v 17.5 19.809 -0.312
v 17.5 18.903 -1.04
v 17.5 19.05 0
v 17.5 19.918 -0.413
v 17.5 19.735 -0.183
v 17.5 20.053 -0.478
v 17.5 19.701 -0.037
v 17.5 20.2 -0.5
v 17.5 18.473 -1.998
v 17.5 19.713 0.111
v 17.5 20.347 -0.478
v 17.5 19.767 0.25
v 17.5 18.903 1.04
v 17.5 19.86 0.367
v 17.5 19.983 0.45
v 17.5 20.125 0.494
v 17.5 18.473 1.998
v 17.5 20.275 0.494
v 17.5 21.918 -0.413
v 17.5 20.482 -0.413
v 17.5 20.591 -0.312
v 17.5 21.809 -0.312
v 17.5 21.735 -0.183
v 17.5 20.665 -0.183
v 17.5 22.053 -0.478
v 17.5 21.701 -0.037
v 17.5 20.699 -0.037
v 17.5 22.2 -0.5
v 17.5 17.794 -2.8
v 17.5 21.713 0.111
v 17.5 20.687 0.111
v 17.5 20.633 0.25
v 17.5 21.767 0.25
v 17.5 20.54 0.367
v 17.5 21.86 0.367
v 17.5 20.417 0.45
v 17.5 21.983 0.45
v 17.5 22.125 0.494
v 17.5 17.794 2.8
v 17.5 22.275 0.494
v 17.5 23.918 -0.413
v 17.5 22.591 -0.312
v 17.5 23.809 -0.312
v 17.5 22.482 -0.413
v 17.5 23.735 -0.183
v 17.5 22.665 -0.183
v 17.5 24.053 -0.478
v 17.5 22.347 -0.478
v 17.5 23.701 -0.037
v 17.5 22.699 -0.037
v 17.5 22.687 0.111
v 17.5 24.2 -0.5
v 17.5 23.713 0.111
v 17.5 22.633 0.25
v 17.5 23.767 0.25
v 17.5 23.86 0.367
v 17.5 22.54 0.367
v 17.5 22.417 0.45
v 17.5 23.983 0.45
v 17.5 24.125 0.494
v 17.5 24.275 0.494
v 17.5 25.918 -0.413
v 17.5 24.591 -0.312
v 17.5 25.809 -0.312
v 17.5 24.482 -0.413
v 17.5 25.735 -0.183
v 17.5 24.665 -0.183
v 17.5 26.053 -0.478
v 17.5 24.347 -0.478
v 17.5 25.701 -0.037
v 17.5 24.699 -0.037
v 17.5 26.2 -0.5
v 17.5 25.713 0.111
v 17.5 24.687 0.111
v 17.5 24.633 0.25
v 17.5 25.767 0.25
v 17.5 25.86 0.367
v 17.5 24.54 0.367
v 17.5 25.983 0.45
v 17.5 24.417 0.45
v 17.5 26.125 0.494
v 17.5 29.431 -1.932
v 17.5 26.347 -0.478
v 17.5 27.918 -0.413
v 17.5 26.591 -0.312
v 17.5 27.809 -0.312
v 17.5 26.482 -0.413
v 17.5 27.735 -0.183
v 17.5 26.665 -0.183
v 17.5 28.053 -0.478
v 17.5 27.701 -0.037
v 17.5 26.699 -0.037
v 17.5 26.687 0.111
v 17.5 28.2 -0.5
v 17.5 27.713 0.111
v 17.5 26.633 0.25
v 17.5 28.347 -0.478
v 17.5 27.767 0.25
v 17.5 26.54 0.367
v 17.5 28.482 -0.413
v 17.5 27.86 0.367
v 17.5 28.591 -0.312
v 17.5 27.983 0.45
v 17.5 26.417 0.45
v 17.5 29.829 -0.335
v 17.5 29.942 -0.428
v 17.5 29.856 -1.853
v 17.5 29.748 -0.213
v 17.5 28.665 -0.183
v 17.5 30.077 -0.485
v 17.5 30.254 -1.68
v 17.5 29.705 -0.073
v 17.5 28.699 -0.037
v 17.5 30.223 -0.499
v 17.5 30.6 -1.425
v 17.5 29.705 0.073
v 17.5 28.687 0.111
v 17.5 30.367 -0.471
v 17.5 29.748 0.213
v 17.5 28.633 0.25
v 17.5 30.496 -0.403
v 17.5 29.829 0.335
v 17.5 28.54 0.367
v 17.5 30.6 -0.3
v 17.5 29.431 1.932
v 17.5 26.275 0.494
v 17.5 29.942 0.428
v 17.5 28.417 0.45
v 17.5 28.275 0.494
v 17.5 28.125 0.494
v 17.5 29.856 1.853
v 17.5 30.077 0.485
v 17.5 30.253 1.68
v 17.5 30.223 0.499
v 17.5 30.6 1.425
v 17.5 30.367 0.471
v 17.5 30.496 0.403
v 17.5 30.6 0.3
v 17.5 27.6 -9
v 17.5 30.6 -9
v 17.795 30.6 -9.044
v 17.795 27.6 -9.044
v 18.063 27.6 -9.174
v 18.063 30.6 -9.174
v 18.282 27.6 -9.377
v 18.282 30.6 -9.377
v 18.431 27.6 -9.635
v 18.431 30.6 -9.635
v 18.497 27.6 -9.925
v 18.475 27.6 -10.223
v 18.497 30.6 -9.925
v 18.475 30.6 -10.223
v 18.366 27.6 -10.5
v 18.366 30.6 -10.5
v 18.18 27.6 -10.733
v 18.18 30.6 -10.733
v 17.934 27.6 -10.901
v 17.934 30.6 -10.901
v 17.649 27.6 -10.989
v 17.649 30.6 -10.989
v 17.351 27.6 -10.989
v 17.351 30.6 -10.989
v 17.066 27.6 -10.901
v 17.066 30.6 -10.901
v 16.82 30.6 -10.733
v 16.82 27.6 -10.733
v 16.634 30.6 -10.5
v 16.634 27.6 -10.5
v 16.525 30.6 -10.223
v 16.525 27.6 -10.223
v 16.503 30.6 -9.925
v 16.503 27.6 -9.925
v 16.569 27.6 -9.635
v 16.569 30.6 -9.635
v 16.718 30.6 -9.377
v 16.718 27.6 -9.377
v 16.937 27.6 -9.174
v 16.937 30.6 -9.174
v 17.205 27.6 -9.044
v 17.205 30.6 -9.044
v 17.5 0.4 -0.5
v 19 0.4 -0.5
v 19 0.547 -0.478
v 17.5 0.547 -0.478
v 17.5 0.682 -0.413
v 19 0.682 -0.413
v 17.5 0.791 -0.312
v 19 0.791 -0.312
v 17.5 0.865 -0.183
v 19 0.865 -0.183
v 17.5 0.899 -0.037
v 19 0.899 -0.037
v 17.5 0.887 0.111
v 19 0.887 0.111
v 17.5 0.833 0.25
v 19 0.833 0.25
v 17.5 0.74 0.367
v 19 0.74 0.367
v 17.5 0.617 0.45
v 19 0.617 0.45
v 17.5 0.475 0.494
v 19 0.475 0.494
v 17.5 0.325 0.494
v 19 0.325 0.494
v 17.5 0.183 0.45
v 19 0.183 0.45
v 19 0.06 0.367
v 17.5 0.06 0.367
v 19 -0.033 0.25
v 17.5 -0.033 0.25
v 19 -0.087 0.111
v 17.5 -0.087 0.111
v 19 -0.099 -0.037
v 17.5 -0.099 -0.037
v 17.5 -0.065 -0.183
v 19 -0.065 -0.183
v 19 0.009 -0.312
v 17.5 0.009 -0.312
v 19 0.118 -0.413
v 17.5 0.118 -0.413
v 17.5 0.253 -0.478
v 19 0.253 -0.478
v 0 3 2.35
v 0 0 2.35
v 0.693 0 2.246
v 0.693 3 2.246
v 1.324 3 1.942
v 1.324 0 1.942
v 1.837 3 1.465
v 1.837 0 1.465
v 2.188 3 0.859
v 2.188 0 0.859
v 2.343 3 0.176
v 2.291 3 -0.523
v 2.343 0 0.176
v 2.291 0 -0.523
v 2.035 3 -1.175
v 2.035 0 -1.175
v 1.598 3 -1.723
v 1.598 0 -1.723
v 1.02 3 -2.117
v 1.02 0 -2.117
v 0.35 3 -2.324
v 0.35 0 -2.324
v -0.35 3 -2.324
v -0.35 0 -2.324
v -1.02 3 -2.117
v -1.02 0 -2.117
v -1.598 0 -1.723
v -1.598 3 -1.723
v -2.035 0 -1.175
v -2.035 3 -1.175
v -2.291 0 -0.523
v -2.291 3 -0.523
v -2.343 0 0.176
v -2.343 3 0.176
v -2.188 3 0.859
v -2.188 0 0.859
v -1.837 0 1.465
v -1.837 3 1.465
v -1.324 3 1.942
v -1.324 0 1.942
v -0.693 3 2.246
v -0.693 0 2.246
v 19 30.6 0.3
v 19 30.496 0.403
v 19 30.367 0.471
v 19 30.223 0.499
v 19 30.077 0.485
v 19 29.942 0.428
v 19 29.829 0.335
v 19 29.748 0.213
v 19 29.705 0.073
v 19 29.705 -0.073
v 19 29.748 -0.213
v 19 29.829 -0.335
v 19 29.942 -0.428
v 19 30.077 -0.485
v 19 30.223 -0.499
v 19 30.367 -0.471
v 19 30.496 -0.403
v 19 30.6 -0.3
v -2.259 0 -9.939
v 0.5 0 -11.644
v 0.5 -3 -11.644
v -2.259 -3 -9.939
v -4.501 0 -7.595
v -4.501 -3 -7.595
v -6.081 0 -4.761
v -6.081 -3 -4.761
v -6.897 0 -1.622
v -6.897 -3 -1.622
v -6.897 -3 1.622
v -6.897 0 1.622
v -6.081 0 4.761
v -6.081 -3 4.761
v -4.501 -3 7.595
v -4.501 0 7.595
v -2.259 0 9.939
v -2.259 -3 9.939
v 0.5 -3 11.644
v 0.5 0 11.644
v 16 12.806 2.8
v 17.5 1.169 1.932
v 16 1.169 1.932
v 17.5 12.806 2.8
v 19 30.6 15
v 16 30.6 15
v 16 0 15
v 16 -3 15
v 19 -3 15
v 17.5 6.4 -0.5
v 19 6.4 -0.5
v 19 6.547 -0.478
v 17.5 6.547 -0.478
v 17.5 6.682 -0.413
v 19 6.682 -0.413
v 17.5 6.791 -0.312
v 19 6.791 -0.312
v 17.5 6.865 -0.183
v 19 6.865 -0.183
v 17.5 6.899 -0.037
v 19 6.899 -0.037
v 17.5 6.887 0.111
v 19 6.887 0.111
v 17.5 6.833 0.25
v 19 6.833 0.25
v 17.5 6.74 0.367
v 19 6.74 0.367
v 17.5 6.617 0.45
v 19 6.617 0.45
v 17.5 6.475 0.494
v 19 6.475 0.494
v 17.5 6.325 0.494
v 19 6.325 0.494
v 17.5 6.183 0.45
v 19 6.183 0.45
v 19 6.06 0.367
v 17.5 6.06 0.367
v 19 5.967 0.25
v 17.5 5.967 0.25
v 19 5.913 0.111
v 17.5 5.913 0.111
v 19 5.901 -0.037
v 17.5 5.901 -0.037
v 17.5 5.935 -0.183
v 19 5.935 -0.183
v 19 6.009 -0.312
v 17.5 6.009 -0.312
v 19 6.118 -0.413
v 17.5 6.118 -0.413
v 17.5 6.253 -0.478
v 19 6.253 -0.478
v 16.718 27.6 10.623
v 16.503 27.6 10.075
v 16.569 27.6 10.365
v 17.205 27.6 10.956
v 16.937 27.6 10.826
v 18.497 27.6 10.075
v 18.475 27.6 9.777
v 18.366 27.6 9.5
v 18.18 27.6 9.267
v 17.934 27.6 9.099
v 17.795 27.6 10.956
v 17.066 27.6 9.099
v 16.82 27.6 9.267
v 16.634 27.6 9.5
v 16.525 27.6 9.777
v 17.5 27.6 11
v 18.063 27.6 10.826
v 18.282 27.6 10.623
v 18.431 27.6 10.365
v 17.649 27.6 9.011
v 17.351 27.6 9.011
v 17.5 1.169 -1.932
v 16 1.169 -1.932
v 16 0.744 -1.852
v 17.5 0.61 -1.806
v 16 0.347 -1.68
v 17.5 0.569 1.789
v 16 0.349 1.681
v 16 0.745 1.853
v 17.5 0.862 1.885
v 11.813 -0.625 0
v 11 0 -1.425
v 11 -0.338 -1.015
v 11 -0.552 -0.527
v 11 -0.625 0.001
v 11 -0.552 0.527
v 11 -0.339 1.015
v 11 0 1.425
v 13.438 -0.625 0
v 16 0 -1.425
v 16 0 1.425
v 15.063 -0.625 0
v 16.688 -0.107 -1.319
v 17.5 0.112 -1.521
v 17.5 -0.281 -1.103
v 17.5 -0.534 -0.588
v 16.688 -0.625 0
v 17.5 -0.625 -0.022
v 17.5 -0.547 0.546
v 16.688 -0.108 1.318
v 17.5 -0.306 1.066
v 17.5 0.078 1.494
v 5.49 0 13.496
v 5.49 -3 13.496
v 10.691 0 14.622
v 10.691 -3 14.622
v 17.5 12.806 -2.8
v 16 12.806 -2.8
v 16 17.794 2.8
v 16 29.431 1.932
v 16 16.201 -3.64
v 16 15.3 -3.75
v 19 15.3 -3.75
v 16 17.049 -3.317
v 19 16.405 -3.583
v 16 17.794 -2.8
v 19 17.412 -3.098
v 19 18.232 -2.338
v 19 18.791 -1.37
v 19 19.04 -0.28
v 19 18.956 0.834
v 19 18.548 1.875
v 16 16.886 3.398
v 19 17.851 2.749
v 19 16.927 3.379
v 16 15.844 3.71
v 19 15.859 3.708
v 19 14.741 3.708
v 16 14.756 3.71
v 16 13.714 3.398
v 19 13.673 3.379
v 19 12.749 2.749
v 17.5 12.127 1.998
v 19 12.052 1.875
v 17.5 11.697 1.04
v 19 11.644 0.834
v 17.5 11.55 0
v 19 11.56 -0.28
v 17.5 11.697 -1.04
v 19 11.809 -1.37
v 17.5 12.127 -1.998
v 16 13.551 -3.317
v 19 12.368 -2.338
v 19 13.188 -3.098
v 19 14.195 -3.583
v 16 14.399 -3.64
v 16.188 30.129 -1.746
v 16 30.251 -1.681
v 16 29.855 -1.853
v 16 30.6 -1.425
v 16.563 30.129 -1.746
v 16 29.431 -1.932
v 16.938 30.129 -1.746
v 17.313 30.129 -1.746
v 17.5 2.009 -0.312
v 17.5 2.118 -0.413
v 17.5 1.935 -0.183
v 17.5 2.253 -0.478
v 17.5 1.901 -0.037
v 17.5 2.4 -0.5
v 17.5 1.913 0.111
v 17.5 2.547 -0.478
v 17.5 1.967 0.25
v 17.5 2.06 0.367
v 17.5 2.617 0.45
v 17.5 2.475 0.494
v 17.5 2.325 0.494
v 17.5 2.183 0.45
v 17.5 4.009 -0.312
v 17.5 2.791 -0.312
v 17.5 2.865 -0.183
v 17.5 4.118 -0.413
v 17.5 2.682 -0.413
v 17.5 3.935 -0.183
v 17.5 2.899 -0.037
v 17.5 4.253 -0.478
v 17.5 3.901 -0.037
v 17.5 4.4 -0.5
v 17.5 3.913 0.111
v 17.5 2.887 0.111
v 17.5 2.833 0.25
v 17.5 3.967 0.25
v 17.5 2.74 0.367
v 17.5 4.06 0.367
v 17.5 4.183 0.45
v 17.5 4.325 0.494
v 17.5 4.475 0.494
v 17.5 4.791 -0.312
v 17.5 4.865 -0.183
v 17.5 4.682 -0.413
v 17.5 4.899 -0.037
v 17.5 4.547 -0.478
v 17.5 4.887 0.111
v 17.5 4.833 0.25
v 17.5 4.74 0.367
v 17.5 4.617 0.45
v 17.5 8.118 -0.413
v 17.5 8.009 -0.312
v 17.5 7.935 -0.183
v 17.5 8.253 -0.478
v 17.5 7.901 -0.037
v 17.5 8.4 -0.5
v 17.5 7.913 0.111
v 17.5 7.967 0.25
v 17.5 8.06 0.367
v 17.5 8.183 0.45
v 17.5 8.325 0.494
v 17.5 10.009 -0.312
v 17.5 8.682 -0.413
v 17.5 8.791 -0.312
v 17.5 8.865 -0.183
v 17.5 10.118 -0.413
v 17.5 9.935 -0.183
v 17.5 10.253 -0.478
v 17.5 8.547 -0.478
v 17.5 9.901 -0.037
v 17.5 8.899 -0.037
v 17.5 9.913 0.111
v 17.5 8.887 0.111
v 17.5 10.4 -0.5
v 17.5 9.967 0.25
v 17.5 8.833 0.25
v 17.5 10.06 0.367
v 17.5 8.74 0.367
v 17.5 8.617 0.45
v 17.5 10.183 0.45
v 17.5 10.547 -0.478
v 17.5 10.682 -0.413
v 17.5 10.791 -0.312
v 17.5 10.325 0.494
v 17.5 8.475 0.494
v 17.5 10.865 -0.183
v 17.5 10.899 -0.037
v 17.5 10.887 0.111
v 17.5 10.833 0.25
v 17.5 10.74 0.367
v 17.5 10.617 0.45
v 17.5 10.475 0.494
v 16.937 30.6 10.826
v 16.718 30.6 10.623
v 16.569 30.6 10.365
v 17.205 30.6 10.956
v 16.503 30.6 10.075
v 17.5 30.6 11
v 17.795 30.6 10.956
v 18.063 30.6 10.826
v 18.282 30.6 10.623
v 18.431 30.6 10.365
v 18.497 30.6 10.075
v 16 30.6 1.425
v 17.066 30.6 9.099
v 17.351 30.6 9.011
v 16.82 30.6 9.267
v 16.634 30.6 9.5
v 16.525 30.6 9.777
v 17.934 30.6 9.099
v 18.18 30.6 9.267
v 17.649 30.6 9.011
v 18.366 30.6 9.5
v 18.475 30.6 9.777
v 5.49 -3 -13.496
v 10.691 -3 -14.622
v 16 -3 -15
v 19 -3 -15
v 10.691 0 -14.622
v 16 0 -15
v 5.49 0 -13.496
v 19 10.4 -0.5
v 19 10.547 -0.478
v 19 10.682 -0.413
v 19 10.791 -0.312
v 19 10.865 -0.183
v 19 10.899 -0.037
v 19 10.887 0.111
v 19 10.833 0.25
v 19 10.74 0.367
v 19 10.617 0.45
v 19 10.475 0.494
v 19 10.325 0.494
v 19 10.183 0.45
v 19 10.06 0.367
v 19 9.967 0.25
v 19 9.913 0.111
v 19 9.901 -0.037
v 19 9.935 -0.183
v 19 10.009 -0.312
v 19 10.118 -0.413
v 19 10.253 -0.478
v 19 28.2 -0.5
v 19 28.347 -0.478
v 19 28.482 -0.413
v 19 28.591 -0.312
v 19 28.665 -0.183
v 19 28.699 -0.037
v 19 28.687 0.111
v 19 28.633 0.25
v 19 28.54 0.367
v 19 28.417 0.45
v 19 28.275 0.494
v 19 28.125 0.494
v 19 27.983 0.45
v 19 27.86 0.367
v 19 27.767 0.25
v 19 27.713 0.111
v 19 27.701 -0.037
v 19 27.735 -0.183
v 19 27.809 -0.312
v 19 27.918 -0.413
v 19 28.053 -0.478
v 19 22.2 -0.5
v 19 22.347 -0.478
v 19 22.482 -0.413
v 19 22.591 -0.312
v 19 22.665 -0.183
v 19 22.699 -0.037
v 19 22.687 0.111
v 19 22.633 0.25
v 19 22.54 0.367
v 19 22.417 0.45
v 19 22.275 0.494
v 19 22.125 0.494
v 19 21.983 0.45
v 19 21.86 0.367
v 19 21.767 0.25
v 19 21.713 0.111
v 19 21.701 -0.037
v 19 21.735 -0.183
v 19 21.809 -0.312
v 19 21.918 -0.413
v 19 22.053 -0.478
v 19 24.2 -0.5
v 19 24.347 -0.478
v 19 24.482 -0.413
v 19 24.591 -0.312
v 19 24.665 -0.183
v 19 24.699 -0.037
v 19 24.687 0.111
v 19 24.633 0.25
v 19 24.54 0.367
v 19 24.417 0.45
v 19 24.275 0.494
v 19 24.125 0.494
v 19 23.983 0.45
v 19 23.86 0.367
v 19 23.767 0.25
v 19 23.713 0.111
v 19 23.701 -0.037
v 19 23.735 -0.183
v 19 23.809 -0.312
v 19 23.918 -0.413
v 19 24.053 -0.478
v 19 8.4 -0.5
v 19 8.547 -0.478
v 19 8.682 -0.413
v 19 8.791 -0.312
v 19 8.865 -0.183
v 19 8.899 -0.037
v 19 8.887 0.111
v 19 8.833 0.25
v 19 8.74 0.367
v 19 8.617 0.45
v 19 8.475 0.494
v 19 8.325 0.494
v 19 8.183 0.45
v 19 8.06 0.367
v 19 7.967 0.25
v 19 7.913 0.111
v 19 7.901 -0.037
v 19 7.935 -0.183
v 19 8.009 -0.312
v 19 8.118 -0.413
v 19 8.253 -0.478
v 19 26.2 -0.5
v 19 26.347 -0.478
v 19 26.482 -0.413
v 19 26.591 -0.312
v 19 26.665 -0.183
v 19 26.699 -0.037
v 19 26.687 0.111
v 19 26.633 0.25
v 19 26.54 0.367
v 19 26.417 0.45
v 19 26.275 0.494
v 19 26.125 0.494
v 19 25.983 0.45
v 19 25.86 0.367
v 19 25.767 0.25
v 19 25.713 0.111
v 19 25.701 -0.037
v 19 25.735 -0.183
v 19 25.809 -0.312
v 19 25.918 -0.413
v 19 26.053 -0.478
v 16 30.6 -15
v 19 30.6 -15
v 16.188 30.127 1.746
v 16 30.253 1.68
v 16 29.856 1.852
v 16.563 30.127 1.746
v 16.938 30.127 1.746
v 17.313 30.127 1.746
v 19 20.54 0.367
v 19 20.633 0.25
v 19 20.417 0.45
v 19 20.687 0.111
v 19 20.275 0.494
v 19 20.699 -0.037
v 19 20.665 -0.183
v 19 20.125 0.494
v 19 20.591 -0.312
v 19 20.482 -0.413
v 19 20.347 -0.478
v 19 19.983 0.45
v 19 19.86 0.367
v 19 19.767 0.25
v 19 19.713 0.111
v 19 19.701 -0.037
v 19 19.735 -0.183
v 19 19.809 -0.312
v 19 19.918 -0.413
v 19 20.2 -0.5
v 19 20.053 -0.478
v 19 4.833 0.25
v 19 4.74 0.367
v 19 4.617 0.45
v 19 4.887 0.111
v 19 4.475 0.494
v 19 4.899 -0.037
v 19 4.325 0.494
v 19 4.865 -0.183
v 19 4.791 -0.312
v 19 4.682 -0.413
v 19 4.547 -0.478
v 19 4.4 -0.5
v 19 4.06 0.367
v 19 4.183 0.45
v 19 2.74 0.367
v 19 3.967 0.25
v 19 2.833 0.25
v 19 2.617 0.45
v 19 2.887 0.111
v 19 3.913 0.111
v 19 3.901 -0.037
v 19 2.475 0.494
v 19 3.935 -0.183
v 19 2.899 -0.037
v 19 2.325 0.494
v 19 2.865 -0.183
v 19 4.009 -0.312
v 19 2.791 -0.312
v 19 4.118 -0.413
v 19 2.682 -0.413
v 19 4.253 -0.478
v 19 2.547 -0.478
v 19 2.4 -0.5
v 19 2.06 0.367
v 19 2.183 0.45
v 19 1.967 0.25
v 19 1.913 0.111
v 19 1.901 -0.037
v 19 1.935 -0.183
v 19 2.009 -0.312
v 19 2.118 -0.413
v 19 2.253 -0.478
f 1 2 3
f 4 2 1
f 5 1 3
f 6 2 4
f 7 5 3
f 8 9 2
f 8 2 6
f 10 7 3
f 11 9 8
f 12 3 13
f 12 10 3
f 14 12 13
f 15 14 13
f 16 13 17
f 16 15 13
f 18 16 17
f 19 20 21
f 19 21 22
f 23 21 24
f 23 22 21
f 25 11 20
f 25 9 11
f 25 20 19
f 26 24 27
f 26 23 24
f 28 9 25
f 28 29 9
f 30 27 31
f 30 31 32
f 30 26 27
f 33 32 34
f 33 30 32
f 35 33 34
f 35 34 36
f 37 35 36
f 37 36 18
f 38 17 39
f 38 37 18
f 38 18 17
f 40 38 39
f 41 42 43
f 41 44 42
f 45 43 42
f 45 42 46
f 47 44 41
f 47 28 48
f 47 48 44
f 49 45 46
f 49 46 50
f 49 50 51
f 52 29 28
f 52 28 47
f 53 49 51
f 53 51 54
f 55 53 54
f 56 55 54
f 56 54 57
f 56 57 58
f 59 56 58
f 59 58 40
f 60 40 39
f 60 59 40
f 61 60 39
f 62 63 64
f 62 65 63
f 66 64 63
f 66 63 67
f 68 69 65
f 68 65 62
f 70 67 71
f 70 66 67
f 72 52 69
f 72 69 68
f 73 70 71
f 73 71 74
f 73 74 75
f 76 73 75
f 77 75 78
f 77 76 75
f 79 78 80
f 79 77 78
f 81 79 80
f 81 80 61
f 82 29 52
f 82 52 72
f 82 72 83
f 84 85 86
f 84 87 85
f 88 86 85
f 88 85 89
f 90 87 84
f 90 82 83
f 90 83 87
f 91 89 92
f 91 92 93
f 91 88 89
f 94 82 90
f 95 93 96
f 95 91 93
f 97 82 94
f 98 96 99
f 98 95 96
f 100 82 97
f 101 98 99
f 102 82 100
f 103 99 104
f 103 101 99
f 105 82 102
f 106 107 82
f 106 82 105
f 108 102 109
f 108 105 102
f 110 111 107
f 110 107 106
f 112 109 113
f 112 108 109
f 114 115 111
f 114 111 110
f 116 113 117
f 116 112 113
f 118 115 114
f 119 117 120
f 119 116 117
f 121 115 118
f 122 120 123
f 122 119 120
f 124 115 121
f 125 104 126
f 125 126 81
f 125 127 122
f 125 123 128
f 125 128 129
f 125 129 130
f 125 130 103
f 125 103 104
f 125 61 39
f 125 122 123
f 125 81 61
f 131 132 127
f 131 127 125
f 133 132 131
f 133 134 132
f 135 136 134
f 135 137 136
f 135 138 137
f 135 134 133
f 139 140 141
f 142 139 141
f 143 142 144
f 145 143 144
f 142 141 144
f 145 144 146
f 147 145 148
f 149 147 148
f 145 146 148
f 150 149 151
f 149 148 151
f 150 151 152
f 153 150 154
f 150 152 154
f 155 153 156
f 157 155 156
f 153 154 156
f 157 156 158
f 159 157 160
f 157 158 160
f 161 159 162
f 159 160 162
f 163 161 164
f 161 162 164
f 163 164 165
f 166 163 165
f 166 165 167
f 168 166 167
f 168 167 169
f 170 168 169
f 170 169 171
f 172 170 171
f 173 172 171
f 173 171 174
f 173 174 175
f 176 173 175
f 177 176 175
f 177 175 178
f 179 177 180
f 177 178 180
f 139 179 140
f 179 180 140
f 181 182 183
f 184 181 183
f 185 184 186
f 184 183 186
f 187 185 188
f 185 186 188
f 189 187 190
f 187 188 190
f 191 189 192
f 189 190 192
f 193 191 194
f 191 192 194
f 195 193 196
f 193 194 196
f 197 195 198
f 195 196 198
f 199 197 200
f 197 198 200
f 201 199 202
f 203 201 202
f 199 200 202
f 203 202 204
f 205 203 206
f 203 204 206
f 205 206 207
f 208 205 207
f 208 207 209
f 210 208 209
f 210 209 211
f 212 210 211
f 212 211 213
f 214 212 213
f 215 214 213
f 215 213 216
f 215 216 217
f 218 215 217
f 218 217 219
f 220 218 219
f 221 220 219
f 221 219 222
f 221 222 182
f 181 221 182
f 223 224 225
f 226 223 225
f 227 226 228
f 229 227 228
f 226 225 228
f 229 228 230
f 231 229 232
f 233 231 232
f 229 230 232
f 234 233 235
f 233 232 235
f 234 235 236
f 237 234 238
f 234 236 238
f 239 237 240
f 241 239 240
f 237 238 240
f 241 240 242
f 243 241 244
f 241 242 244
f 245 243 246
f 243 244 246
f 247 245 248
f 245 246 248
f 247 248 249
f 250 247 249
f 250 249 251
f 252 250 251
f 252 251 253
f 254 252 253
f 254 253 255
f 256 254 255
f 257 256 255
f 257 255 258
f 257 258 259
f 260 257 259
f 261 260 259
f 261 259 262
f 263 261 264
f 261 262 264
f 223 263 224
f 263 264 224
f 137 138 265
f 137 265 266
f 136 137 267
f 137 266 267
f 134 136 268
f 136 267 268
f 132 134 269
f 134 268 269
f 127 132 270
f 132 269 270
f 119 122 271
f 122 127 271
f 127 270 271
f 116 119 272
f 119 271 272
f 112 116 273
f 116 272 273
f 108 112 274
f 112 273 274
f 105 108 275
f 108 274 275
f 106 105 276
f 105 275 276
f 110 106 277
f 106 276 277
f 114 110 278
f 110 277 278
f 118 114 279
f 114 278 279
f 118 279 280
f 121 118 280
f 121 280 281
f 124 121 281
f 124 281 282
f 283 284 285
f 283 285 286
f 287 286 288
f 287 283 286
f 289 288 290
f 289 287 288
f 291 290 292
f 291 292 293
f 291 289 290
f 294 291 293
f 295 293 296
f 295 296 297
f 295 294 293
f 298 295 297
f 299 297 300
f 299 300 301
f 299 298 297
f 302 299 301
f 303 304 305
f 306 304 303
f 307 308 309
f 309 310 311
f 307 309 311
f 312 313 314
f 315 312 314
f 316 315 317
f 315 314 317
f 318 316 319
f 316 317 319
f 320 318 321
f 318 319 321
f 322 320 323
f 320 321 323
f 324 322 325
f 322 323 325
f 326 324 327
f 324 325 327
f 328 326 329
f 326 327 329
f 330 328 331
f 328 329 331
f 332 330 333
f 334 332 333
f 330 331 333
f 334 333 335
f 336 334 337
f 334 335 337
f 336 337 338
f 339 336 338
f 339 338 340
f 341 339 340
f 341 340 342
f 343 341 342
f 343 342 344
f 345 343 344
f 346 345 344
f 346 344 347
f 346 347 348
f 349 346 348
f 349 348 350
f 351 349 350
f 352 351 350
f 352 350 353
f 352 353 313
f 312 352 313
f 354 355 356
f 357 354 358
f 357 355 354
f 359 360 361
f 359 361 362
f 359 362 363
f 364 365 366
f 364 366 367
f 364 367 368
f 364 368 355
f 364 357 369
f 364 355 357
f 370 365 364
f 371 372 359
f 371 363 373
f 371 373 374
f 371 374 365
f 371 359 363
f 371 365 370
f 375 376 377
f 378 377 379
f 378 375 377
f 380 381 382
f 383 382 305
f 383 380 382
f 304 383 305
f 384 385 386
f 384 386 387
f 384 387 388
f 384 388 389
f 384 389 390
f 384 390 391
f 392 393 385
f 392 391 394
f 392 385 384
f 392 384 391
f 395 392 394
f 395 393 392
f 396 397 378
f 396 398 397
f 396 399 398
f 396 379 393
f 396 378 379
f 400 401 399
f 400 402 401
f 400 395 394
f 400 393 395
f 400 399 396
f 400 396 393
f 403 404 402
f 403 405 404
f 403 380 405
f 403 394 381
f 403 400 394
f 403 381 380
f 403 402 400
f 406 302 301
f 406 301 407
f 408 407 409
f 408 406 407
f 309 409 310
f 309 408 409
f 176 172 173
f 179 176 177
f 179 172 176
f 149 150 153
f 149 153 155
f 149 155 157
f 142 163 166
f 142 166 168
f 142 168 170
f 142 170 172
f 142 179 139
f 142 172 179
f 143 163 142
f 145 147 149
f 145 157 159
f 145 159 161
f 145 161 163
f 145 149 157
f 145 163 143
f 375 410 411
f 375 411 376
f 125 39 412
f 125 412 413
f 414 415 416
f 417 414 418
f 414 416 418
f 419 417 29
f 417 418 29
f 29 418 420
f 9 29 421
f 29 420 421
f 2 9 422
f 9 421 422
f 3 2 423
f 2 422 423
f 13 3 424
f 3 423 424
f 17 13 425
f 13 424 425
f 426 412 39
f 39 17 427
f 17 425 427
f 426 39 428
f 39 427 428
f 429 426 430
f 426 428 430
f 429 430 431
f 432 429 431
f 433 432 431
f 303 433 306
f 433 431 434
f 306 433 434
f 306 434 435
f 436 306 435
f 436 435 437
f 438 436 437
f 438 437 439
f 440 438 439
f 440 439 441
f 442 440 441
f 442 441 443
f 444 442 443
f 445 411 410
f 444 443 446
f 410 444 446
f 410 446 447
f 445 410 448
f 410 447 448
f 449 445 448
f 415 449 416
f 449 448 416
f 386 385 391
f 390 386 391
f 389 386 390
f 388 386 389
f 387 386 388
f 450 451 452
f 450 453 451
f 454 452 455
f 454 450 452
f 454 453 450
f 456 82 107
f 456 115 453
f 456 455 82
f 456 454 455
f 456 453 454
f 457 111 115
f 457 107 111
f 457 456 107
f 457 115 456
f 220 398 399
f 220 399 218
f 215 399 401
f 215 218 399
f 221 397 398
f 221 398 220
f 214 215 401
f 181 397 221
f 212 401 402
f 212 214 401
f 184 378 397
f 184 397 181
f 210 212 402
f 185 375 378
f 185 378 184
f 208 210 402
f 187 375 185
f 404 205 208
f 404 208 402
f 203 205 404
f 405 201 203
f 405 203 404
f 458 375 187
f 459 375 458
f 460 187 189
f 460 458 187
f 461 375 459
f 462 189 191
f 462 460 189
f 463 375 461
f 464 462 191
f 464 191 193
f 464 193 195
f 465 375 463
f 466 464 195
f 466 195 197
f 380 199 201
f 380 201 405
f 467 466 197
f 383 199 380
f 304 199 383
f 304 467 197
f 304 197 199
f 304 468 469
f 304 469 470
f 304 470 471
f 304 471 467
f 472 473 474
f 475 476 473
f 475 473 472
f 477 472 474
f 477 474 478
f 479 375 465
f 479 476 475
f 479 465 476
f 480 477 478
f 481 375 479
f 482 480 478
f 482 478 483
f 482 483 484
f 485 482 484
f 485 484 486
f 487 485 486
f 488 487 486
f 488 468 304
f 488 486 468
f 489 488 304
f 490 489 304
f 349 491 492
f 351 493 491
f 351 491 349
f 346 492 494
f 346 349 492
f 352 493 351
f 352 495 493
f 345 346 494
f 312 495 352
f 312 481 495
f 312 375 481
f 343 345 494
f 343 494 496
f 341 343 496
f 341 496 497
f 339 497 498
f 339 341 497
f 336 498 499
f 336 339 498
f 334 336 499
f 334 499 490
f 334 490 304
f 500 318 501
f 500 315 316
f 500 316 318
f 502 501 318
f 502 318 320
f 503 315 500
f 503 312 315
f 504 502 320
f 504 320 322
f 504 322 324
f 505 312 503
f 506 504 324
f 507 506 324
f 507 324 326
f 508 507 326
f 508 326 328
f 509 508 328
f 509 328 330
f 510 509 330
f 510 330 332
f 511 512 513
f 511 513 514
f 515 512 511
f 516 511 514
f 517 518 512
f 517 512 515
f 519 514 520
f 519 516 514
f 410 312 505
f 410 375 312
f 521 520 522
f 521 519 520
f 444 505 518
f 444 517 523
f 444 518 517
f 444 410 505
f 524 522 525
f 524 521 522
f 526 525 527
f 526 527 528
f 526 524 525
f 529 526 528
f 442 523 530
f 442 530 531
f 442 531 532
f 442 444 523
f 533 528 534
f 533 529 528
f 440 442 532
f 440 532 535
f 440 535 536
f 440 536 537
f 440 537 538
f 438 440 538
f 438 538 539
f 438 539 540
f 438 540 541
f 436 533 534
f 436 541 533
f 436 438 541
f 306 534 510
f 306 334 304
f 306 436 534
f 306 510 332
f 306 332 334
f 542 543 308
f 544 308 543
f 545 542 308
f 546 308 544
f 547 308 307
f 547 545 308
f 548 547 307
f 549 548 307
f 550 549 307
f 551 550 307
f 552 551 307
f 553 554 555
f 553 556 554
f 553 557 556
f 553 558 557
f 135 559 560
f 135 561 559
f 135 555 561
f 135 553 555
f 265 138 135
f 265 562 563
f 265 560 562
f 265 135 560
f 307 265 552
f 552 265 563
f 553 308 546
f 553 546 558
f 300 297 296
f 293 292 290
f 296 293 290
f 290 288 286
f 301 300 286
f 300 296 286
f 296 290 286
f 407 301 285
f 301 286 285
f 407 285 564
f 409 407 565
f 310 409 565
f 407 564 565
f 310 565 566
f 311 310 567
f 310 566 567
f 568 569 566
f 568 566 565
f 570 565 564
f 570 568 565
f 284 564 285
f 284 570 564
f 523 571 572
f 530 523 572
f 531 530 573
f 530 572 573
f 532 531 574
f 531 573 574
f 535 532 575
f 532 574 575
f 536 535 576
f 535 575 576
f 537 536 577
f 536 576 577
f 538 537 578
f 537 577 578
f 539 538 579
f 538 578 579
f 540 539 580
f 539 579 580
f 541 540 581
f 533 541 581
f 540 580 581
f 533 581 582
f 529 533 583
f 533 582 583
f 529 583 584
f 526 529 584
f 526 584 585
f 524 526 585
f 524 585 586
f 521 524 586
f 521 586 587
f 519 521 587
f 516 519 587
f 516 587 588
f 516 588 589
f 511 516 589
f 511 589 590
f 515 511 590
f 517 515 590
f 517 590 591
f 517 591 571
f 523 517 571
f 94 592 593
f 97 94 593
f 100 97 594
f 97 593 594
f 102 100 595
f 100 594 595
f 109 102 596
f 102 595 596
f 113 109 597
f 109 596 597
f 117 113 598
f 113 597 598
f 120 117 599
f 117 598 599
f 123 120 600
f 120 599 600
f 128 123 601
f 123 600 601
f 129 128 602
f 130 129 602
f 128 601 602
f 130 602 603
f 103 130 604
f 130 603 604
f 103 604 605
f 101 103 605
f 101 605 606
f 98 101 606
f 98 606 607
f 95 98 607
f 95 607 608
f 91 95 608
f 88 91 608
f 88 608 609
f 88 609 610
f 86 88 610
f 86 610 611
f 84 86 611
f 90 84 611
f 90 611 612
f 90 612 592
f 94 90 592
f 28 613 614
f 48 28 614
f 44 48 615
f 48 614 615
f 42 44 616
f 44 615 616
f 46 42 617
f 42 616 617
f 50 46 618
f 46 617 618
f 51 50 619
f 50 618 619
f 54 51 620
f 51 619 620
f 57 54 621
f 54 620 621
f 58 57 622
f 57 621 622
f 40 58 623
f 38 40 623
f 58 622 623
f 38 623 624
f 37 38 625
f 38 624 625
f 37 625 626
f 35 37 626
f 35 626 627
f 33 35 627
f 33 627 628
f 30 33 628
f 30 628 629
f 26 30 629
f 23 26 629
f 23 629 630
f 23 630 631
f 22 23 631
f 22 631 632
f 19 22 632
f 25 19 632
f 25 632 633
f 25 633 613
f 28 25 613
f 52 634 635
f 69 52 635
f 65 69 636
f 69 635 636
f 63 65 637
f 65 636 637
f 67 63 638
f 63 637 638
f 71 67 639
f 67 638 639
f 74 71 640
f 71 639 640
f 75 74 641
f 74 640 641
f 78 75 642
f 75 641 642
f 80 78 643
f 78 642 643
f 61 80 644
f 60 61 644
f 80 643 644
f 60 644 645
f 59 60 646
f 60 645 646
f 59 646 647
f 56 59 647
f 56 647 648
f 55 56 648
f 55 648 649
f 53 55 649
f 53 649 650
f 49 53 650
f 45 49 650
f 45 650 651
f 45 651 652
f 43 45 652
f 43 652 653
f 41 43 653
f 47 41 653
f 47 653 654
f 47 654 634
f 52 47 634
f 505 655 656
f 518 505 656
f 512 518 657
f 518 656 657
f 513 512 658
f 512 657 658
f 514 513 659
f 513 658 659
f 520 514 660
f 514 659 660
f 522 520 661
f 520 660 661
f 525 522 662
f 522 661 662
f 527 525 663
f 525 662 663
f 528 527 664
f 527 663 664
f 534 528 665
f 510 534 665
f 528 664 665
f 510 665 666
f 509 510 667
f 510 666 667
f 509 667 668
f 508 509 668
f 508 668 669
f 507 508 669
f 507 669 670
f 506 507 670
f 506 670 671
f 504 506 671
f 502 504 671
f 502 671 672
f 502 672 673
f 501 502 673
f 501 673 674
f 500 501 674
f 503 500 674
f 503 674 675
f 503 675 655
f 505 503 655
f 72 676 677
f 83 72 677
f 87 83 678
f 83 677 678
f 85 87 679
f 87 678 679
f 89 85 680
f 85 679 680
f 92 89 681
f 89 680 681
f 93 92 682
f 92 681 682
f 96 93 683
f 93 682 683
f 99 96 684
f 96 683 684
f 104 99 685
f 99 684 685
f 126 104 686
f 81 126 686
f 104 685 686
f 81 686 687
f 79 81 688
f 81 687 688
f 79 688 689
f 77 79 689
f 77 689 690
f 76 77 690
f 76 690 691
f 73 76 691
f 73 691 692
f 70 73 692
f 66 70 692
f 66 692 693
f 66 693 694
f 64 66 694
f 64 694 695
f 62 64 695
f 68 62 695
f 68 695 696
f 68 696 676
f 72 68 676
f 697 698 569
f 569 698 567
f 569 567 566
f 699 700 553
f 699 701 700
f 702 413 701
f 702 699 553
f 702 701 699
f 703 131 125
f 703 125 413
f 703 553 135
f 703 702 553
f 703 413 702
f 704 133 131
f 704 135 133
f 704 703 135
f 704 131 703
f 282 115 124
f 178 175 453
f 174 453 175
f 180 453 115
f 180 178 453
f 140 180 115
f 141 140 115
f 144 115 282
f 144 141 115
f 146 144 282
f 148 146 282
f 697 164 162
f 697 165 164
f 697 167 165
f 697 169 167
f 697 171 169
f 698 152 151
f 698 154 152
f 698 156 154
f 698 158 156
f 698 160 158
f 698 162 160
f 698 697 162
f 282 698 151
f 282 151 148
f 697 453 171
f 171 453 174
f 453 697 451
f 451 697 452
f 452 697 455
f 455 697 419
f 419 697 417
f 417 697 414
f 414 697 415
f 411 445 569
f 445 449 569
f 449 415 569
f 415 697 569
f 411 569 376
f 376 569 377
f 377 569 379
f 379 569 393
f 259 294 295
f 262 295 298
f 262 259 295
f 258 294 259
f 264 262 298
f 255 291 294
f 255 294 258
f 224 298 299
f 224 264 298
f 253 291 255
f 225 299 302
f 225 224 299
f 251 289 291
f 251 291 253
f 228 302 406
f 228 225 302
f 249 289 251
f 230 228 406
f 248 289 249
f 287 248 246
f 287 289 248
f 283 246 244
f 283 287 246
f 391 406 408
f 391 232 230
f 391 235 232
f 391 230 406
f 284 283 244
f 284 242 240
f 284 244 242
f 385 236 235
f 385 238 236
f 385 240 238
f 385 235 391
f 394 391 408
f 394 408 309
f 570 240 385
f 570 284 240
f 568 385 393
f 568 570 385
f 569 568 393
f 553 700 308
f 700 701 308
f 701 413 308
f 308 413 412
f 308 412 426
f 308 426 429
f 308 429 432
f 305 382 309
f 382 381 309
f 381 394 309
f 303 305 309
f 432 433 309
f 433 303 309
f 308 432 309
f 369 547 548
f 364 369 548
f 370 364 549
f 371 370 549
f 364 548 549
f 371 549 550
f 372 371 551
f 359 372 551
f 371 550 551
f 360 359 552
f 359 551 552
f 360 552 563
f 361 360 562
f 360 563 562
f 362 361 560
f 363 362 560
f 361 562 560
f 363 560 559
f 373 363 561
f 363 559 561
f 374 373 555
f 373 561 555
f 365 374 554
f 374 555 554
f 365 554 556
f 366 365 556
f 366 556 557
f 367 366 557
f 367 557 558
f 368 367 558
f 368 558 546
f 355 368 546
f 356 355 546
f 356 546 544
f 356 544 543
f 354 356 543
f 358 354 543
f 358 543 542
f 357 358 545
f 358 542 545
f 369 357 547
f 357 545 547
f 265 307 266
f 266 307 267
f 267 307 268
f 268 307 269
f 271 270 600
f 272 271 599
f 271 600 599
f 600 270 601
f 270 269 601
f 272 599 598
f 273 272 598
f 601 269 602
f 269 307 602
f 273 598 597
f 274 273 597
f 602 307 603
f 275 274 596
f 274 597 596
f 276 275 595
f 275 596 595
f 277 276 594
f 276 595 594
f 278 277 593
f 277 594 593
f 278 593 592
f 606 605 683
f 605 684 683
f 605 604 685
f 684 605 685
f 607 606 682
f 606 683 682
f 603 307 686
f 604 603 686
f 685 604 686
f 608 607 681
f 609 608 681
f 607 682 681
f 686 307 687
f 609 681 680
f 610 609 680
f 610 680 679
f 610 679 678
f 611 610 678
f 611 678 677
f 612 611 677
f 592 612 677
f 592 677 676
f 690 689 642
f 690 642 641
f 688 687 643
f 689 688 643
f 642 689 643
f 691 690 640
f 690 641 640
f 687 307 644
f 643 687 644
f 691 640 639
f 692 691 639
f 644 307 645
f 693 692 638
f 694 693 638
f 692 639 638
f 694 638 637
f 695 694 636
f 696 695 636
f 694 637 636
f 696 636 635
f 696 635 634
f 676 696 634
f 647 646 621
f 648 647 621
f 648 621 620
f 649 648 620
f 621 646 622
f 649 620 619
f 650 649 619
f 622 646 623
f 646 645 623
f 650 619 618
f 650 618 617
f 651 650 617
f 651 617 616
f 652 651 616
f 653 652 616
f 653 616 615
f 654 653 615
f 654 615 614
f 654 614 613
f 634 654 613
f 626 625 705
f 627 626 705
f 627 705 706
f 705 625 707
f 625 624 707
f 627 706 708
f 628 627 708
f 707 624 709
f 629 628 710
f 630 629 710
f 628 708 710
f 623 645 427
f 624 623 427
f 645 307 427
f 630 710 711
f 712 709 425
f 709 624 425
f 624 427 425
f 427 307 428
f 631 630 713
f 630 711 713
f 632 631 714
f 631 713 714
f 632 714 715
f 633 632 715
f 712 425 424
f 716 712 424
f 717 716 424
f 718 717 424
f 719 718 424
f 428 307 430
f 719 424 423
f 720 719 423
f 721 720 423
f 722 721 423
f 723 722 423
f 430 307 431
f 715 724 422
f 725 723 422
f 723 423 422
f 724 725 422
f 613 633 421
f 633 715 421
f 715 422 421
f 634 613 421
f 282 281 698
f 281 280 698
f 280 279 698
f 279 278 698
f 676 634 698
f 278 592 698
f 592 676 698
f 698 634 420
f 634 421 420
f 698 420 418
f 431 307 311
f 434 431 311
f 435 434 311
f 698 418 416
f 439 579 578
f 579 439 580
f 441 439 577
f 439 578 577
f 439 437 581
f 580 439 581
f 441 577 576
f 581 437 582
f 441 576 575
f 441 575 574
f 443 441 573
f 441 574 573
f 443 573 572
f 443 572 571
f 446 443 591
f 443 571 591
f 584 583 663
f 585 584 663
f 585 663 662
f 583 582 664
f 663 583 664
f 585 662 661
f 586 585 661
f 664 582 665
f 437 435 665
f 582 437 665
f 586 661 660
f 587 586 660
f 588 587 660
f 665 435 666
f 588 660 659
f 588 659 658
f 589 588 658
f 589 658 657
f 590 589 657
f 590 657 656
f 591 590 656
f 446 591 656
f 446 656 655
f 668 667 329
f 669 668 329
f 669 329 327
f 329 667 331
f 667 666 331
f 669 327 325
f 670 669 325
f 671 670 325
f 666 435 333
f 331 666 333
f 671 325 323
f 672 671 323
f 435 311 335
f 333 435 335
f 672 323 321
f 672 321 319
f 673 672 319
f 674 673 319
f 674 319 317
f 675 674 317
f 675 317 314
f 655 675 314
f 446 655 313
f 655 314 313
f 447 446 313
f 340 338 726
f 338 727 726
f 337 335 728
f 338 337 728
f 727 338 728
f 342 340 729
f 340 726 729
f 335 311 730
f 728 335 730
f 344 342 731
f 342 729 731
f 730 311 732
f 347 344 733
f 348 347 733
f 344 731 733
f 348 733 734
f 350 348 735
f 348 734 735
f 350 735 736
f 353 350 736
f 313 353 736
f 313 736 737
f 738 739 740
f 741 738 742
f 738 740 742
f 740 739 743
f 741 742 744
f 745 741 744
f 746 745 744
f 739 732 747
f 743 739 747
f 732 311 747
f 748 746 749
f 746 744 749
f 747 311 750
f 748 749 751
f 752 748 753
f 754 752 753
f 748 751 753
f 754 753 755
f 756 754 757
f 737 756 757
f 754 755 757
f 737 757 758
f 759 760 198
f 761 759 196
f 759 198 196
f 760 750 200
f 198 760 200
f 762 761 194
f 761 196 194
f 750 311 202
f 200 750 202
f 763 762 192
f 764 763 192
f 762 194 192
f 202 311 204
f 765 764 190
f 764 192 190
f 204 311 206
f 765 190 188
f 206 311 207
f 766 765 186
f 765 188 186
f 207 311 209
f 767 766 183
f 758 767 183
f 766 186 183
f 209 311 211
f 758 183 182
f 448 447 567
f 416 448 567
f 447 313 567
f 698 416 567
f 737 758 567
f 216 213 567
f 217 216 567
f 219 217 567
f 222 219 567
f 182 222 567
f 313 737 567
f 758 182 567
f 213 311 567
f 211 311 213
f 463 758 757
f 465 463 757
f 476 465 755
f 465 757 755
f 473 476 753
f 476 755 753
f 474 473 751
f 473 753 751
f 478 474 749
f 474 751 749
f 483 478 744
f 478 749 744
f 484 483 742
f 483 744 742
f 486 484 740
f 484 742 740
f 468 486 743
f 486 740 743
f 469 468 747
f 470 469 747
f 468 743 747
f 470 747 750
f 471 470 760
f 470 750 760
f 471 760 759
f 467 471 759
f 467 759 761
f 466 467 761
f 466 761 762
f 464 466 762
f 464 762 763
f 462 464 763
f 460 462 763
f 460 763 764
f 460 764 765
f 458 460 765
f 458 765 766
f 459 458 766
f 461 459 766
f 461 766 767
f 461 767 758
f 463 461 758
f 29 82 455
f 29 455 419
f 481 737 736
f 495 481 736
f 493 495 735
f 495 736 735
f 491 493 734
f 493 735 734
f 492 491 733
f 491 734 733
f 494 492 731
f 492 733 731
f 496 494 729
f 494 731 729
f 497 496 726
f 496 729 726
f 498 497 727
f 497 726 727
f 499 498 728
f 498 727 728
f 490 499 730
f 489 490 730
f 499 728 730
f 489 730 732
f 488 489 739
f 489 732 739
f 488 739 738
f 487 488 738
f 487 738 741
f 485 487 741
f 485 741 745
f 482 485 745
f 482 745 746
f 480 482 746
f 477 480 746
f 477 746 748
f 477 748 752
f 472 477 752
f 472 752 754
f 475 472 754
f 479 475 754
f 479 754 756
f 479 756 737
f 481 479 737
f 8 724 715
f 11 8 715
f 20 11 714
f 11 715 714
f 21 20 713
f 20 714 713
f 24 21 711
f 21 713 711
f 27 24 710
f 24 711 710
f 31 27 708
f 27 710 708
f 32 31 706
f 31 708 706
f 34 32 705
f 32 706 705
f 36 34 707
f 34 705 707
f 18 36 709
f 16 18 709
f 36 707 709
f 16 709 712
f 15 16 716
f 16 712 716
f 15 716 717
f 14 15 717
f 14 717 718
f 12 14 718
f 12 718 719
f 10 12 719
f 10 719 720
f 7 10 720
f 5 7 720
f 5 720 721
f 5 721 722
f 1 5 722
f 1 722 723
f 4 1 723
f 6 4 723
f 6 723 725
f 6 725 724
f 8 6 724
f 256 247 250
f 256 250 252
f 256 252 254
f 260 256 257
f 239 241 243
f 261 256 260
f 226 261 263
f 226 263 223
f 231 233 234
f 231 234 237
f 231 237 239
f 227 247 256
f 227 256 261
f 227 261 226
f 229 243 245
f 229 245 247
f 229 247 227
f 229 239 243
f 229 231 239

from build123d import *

# Parameters (mm, degrees)
BOSS_EXTRUDE1_DEPTH          = 3
BOSS_EXTRU_1_DEPTH           = 30.6
ESQUISSE2_R                  = 1.0000000000000018
ENL_V_MAT_EXTRU_1_DEPTH      = 3
ESQUISSE3_R                  = 2.349999999999996
BOSS_EXTRU_2_DEPTH           = 3
ESQUISSE4_R                  = 2.5
ENL_V_MAT_EXTRU_2_DEPTH      = 42.11398788733586
ENL_V_MAT_EXTRU_3_DEPTH      = 5
ENL_V_MAT_EXTRU_3_DEPTH_BACK = 1.5
ESQUISSE6_R                  = 0.4999999999999987
ESQUISSE6_R_2                = 0.5000000000000008
ESQUISSE6_R_3                = 0.49999999999999967
ESQUISSE6_R_4                = 3.749999999999999
ENL_V_MAT_EXTRU_4_DEPTH      = 3


with BuildPart() as part:
    # Sketch1 → Boss-Extrude1 (new body)
    with BuildSketch(Plane(origin=(0, 0, 0), x_dir=(1, 0, 0), z_dir=(0, 1, 0))):
        with BuildLine():
            Line((19, 15), (16.00000000000001, 15))
            ThreePointArc((16.00000000000001, 15.000000000000007), (8.070475080311514, 14.151517110035783), (0.5000000000000107, 11.644487847162011))
            ThreePointArc((0.5000000000000098, 11.64448784716201), (-6.999999999999976, -4.4e-16), (0.5000000000000098, -11.644487847162011))
            ThreePointArc((0.5000000000000107, -11.644487847162011), (8.070475080311514, -14.151517110035783), (16.00000000000001, -15.000000000000007))
            Line((16.00000000000001, -15), (19, -15))
            Line((19, -15), (19, 15))
        make_face()
    extrude(amount=-BOSS_EXTRUDE1_DEPTH)

    # Esquisse1 → Boss.-Extru.1 (add)
    with BuildSketch(Plane(origin=(0, 0, 0), x_dir=(1, 0, 0), z_dir=(0, 1, 0))):
        Polygon((19, 15), (16.000000000000007, 15), (16.00000000000001, -15), (19.000000000000004, -15), align=None)
    extrude(amount=BOSS_EXTRU_1_DEPTH)

    # Esquisse2 → Enlèv. mat.-Extru.1 (cut)
    with BuildSketch(Plane(origin=(0, 30.6, 0), x_dir=(1, 0, 0), z_dir=(0, 1, 0))):
        with Locations(Location((17.500000000000004, 10, 0), (0, 0, 270))):
            Circle(ESQUISSE2_R)
        with Locations(Location((17.500000000000004, -10, 0), (0, 0, 270))):
            Circle(ESQUISSE2_R)
    extrude(amount=-ENL_V_MAT_EXTRU_1_DEPTH, mode=Mode.SUBTRACT)

    # Esquisse3 → Boss.-Extru.2 (add)
    with BuildSketch(Plane(origin=(0, 0, 0), x_dir=(1, 0, 0), z_dir=(0, 1, 0))):
        with Locations(Location((0, 0, 0), (0, 0, 270))):
            Circle(ESQUISSE3_R)
    extrude(amount=BOSS_EXTRU_2_DEPTH)

    # Esquisse4 → Enlèv. mat.-Extru.2 (cut, through all)
    with BuildSketch(Plane.ZY.offset(-16.000000000000007)):
        with Locations((0, 15.3)):
            Circle(ESQUISSE4_R)
    extrude(amount=-ENL_V_MAT_EXTRU_2_DEPTH, mode=Mode.SUBTRACT)

    # Esquisse5 → Enlèv. mat.-Extru.3 (cut, two sides: drawn at the far end of the back side and taken through both)
    with BuildSketch(Plane.ZY.offset(-16.000000000000007).offset(-ENL_V_MAT_EXTRU_3_DEPTH_BACK)):
        with BuildLine():
            Line((-2.8000000000001206, 12.805506063347845), (-1.9323091258538179, 1.1685931981230362))
            add(Edge.make_bspline(
                [(-1.9323091258538179, 1.1685931981230362), (-1.9048352156569601, 0.8027138716048543), (-1.7460527055675423, 0.47250804579621575), (-1.5874431867330887, 0.14266197447294557), (-1.3185847338688517, -0.10715488116746878), (-1.0505560477953044, -0.3562007373159315), (-0.7091686681940543, -0.4905620157021409), (-0.3678310237411564, -0.6249037196151552), (-1.5634e-13, -0.6249999999988765), (0.3661752794111309, -0.6250958469887595), (0.7080076723836786, -0.4910181757340655), (1.0487343876149366, -0.35737418689144385), (1.3178512419643233, -0.1078357174129213), (1.5861375320152837, 0.14093261173257243), (1.745511479884174, 0.4713841828126921), (1.9047478532446405, 0.8015505020492266), (1.932309125853515, 1.1685931981230258)],
                knots=[0, 0, 0, 0.125, 0.125, 0.25, 0.25, 0.375, 0.375, 0.5, 0.5, 0.625, 0.625, 0.75, 0.75, 0.875, 0.875, 1, 1, 1], degree=2))
            Line((1.932309125853515, 1.1685931981230258), (2.7999999999998786, 12.80550606334783))
            ThreePointArc((2.7999999999998786, 12.80550606334783), (3.7499999999998854, 15.300000000001111), (2.799999999999892, 17.794493936654398))
            Line((2.799999999999892, 17.794493936654398), (1.9323091258535894, 29.43140680187921))
            add(Edge.make_bspline(
                [(1.9323091258535894, 29.43140680187921), (1.9048352156568606, 29.797286128395676), (1.746052705567315, 30.12749195420603), (1.587443186734994, 30.45733802552631), (1.318584733868623, 30.70715488116971), (1.0505560477969664, 30.956200737317417), (0.7091686681938255, 31.090562015704386), (0.36783102373777693, 31.224903719618656), (-7.308e-14, 31.225000000001117), (-0.36617527942078804, 31.22509584698975), (-0.7080076723839066, 31.091018175736306), (-1.0487343876225454, 30.957374186888348), (-1.3178512419645536, 30.70783571741516), (-1.586137532016866, 30.45906738826691), (-1.745511479884403, 30.128615817189548), (-1.9047478532448734, 29.798449497952962), (-1.932309125853744, 29.431406801879216)],
                knots=[0, 0, 0, 0.125, 0.125, 0.25, 0.25, 0.375, 0.375, 0.5, 0.5, 0.625, 0.625, 0.75, 0.75, 0.875, 0.875, 1, 1, 1], degree=2))
            Line((-1.932309125853744, 29.431406801879216), (-2.8000000000001077, 17.794493936654412))
            ThreePointArc((-2.8000000000001077, 17.794493936654412), (-3.7500000000001132, 15.300000000001132), (-2.8000000000001206, 12.805506063347845))
        make_face()
    extrude(amount=ENL_V_MAT_EXTRU_3_DEPTH + ENL_V_MAT_EXTRU_3_DEPTH_BACK, mode=Mode.SUBTRACT)

    # Esquisse6 → Enlèv. mat.-Extru.4 (cut)
    with BuildSketch(Plane(origin=(19, 0, 0), x_dir=(0, 0, -1), z_dir=(1, 0, 0))):
        with Locations((7.86e-14, 30.20000000000113)):
            Circle(ESQUISSE6_R)
        with Locations((8.389e-14, 28.200000000001125)):
            Circle(ESQUISSE6_R)
        with Locations((8.917e-14, 26.200000000001125)):
            Circle(ESQUISSE6_R)
        with Locations((9.445e-14, 24.200000000001122)):
            Circle(ESQUISSE6_R_2)
        with Locations((9.974e-14, 22.200000000001125)):
            Circle(ESQUISSE6_R_3)
        with Locations((1.0502e-13, 20.200000000001125)):
            Circle(ESQUISSE6_R)
        with Locations((1.309e-13, 10.400000000001125)):
            Circle(ESQUISSE6_R_3)
        with Locations((1.3619e-13, 8.400000000001125)):
            Circle(ESQUISSE6_R_3)
        with Locations((1.4147e-13, 6.400000000001126)):
            Circle(ESQUISSE6_R_3)
        with Locations((1.4675e-13, 4.400000000001127)):
            Circle(ESQUISSE6_R_3)
        with Locations((1.5204e-13, 2.4000000000011252)):
            Circle(ESQUISSE6_R_3)
        with Locations((1.5732e-13, 0.4000000000011234)):
            Circle(ESQUISSE6_R_3)
        with Locations((1.1848e-13, 15.300000000001125)):
            Circle(ESQUISSE6_R_4)
    extrude(amount=-ENL_V_MAT_EXTRU_4_DEPTH, mode=Mode.SUBTRACT)


solid = part.part
